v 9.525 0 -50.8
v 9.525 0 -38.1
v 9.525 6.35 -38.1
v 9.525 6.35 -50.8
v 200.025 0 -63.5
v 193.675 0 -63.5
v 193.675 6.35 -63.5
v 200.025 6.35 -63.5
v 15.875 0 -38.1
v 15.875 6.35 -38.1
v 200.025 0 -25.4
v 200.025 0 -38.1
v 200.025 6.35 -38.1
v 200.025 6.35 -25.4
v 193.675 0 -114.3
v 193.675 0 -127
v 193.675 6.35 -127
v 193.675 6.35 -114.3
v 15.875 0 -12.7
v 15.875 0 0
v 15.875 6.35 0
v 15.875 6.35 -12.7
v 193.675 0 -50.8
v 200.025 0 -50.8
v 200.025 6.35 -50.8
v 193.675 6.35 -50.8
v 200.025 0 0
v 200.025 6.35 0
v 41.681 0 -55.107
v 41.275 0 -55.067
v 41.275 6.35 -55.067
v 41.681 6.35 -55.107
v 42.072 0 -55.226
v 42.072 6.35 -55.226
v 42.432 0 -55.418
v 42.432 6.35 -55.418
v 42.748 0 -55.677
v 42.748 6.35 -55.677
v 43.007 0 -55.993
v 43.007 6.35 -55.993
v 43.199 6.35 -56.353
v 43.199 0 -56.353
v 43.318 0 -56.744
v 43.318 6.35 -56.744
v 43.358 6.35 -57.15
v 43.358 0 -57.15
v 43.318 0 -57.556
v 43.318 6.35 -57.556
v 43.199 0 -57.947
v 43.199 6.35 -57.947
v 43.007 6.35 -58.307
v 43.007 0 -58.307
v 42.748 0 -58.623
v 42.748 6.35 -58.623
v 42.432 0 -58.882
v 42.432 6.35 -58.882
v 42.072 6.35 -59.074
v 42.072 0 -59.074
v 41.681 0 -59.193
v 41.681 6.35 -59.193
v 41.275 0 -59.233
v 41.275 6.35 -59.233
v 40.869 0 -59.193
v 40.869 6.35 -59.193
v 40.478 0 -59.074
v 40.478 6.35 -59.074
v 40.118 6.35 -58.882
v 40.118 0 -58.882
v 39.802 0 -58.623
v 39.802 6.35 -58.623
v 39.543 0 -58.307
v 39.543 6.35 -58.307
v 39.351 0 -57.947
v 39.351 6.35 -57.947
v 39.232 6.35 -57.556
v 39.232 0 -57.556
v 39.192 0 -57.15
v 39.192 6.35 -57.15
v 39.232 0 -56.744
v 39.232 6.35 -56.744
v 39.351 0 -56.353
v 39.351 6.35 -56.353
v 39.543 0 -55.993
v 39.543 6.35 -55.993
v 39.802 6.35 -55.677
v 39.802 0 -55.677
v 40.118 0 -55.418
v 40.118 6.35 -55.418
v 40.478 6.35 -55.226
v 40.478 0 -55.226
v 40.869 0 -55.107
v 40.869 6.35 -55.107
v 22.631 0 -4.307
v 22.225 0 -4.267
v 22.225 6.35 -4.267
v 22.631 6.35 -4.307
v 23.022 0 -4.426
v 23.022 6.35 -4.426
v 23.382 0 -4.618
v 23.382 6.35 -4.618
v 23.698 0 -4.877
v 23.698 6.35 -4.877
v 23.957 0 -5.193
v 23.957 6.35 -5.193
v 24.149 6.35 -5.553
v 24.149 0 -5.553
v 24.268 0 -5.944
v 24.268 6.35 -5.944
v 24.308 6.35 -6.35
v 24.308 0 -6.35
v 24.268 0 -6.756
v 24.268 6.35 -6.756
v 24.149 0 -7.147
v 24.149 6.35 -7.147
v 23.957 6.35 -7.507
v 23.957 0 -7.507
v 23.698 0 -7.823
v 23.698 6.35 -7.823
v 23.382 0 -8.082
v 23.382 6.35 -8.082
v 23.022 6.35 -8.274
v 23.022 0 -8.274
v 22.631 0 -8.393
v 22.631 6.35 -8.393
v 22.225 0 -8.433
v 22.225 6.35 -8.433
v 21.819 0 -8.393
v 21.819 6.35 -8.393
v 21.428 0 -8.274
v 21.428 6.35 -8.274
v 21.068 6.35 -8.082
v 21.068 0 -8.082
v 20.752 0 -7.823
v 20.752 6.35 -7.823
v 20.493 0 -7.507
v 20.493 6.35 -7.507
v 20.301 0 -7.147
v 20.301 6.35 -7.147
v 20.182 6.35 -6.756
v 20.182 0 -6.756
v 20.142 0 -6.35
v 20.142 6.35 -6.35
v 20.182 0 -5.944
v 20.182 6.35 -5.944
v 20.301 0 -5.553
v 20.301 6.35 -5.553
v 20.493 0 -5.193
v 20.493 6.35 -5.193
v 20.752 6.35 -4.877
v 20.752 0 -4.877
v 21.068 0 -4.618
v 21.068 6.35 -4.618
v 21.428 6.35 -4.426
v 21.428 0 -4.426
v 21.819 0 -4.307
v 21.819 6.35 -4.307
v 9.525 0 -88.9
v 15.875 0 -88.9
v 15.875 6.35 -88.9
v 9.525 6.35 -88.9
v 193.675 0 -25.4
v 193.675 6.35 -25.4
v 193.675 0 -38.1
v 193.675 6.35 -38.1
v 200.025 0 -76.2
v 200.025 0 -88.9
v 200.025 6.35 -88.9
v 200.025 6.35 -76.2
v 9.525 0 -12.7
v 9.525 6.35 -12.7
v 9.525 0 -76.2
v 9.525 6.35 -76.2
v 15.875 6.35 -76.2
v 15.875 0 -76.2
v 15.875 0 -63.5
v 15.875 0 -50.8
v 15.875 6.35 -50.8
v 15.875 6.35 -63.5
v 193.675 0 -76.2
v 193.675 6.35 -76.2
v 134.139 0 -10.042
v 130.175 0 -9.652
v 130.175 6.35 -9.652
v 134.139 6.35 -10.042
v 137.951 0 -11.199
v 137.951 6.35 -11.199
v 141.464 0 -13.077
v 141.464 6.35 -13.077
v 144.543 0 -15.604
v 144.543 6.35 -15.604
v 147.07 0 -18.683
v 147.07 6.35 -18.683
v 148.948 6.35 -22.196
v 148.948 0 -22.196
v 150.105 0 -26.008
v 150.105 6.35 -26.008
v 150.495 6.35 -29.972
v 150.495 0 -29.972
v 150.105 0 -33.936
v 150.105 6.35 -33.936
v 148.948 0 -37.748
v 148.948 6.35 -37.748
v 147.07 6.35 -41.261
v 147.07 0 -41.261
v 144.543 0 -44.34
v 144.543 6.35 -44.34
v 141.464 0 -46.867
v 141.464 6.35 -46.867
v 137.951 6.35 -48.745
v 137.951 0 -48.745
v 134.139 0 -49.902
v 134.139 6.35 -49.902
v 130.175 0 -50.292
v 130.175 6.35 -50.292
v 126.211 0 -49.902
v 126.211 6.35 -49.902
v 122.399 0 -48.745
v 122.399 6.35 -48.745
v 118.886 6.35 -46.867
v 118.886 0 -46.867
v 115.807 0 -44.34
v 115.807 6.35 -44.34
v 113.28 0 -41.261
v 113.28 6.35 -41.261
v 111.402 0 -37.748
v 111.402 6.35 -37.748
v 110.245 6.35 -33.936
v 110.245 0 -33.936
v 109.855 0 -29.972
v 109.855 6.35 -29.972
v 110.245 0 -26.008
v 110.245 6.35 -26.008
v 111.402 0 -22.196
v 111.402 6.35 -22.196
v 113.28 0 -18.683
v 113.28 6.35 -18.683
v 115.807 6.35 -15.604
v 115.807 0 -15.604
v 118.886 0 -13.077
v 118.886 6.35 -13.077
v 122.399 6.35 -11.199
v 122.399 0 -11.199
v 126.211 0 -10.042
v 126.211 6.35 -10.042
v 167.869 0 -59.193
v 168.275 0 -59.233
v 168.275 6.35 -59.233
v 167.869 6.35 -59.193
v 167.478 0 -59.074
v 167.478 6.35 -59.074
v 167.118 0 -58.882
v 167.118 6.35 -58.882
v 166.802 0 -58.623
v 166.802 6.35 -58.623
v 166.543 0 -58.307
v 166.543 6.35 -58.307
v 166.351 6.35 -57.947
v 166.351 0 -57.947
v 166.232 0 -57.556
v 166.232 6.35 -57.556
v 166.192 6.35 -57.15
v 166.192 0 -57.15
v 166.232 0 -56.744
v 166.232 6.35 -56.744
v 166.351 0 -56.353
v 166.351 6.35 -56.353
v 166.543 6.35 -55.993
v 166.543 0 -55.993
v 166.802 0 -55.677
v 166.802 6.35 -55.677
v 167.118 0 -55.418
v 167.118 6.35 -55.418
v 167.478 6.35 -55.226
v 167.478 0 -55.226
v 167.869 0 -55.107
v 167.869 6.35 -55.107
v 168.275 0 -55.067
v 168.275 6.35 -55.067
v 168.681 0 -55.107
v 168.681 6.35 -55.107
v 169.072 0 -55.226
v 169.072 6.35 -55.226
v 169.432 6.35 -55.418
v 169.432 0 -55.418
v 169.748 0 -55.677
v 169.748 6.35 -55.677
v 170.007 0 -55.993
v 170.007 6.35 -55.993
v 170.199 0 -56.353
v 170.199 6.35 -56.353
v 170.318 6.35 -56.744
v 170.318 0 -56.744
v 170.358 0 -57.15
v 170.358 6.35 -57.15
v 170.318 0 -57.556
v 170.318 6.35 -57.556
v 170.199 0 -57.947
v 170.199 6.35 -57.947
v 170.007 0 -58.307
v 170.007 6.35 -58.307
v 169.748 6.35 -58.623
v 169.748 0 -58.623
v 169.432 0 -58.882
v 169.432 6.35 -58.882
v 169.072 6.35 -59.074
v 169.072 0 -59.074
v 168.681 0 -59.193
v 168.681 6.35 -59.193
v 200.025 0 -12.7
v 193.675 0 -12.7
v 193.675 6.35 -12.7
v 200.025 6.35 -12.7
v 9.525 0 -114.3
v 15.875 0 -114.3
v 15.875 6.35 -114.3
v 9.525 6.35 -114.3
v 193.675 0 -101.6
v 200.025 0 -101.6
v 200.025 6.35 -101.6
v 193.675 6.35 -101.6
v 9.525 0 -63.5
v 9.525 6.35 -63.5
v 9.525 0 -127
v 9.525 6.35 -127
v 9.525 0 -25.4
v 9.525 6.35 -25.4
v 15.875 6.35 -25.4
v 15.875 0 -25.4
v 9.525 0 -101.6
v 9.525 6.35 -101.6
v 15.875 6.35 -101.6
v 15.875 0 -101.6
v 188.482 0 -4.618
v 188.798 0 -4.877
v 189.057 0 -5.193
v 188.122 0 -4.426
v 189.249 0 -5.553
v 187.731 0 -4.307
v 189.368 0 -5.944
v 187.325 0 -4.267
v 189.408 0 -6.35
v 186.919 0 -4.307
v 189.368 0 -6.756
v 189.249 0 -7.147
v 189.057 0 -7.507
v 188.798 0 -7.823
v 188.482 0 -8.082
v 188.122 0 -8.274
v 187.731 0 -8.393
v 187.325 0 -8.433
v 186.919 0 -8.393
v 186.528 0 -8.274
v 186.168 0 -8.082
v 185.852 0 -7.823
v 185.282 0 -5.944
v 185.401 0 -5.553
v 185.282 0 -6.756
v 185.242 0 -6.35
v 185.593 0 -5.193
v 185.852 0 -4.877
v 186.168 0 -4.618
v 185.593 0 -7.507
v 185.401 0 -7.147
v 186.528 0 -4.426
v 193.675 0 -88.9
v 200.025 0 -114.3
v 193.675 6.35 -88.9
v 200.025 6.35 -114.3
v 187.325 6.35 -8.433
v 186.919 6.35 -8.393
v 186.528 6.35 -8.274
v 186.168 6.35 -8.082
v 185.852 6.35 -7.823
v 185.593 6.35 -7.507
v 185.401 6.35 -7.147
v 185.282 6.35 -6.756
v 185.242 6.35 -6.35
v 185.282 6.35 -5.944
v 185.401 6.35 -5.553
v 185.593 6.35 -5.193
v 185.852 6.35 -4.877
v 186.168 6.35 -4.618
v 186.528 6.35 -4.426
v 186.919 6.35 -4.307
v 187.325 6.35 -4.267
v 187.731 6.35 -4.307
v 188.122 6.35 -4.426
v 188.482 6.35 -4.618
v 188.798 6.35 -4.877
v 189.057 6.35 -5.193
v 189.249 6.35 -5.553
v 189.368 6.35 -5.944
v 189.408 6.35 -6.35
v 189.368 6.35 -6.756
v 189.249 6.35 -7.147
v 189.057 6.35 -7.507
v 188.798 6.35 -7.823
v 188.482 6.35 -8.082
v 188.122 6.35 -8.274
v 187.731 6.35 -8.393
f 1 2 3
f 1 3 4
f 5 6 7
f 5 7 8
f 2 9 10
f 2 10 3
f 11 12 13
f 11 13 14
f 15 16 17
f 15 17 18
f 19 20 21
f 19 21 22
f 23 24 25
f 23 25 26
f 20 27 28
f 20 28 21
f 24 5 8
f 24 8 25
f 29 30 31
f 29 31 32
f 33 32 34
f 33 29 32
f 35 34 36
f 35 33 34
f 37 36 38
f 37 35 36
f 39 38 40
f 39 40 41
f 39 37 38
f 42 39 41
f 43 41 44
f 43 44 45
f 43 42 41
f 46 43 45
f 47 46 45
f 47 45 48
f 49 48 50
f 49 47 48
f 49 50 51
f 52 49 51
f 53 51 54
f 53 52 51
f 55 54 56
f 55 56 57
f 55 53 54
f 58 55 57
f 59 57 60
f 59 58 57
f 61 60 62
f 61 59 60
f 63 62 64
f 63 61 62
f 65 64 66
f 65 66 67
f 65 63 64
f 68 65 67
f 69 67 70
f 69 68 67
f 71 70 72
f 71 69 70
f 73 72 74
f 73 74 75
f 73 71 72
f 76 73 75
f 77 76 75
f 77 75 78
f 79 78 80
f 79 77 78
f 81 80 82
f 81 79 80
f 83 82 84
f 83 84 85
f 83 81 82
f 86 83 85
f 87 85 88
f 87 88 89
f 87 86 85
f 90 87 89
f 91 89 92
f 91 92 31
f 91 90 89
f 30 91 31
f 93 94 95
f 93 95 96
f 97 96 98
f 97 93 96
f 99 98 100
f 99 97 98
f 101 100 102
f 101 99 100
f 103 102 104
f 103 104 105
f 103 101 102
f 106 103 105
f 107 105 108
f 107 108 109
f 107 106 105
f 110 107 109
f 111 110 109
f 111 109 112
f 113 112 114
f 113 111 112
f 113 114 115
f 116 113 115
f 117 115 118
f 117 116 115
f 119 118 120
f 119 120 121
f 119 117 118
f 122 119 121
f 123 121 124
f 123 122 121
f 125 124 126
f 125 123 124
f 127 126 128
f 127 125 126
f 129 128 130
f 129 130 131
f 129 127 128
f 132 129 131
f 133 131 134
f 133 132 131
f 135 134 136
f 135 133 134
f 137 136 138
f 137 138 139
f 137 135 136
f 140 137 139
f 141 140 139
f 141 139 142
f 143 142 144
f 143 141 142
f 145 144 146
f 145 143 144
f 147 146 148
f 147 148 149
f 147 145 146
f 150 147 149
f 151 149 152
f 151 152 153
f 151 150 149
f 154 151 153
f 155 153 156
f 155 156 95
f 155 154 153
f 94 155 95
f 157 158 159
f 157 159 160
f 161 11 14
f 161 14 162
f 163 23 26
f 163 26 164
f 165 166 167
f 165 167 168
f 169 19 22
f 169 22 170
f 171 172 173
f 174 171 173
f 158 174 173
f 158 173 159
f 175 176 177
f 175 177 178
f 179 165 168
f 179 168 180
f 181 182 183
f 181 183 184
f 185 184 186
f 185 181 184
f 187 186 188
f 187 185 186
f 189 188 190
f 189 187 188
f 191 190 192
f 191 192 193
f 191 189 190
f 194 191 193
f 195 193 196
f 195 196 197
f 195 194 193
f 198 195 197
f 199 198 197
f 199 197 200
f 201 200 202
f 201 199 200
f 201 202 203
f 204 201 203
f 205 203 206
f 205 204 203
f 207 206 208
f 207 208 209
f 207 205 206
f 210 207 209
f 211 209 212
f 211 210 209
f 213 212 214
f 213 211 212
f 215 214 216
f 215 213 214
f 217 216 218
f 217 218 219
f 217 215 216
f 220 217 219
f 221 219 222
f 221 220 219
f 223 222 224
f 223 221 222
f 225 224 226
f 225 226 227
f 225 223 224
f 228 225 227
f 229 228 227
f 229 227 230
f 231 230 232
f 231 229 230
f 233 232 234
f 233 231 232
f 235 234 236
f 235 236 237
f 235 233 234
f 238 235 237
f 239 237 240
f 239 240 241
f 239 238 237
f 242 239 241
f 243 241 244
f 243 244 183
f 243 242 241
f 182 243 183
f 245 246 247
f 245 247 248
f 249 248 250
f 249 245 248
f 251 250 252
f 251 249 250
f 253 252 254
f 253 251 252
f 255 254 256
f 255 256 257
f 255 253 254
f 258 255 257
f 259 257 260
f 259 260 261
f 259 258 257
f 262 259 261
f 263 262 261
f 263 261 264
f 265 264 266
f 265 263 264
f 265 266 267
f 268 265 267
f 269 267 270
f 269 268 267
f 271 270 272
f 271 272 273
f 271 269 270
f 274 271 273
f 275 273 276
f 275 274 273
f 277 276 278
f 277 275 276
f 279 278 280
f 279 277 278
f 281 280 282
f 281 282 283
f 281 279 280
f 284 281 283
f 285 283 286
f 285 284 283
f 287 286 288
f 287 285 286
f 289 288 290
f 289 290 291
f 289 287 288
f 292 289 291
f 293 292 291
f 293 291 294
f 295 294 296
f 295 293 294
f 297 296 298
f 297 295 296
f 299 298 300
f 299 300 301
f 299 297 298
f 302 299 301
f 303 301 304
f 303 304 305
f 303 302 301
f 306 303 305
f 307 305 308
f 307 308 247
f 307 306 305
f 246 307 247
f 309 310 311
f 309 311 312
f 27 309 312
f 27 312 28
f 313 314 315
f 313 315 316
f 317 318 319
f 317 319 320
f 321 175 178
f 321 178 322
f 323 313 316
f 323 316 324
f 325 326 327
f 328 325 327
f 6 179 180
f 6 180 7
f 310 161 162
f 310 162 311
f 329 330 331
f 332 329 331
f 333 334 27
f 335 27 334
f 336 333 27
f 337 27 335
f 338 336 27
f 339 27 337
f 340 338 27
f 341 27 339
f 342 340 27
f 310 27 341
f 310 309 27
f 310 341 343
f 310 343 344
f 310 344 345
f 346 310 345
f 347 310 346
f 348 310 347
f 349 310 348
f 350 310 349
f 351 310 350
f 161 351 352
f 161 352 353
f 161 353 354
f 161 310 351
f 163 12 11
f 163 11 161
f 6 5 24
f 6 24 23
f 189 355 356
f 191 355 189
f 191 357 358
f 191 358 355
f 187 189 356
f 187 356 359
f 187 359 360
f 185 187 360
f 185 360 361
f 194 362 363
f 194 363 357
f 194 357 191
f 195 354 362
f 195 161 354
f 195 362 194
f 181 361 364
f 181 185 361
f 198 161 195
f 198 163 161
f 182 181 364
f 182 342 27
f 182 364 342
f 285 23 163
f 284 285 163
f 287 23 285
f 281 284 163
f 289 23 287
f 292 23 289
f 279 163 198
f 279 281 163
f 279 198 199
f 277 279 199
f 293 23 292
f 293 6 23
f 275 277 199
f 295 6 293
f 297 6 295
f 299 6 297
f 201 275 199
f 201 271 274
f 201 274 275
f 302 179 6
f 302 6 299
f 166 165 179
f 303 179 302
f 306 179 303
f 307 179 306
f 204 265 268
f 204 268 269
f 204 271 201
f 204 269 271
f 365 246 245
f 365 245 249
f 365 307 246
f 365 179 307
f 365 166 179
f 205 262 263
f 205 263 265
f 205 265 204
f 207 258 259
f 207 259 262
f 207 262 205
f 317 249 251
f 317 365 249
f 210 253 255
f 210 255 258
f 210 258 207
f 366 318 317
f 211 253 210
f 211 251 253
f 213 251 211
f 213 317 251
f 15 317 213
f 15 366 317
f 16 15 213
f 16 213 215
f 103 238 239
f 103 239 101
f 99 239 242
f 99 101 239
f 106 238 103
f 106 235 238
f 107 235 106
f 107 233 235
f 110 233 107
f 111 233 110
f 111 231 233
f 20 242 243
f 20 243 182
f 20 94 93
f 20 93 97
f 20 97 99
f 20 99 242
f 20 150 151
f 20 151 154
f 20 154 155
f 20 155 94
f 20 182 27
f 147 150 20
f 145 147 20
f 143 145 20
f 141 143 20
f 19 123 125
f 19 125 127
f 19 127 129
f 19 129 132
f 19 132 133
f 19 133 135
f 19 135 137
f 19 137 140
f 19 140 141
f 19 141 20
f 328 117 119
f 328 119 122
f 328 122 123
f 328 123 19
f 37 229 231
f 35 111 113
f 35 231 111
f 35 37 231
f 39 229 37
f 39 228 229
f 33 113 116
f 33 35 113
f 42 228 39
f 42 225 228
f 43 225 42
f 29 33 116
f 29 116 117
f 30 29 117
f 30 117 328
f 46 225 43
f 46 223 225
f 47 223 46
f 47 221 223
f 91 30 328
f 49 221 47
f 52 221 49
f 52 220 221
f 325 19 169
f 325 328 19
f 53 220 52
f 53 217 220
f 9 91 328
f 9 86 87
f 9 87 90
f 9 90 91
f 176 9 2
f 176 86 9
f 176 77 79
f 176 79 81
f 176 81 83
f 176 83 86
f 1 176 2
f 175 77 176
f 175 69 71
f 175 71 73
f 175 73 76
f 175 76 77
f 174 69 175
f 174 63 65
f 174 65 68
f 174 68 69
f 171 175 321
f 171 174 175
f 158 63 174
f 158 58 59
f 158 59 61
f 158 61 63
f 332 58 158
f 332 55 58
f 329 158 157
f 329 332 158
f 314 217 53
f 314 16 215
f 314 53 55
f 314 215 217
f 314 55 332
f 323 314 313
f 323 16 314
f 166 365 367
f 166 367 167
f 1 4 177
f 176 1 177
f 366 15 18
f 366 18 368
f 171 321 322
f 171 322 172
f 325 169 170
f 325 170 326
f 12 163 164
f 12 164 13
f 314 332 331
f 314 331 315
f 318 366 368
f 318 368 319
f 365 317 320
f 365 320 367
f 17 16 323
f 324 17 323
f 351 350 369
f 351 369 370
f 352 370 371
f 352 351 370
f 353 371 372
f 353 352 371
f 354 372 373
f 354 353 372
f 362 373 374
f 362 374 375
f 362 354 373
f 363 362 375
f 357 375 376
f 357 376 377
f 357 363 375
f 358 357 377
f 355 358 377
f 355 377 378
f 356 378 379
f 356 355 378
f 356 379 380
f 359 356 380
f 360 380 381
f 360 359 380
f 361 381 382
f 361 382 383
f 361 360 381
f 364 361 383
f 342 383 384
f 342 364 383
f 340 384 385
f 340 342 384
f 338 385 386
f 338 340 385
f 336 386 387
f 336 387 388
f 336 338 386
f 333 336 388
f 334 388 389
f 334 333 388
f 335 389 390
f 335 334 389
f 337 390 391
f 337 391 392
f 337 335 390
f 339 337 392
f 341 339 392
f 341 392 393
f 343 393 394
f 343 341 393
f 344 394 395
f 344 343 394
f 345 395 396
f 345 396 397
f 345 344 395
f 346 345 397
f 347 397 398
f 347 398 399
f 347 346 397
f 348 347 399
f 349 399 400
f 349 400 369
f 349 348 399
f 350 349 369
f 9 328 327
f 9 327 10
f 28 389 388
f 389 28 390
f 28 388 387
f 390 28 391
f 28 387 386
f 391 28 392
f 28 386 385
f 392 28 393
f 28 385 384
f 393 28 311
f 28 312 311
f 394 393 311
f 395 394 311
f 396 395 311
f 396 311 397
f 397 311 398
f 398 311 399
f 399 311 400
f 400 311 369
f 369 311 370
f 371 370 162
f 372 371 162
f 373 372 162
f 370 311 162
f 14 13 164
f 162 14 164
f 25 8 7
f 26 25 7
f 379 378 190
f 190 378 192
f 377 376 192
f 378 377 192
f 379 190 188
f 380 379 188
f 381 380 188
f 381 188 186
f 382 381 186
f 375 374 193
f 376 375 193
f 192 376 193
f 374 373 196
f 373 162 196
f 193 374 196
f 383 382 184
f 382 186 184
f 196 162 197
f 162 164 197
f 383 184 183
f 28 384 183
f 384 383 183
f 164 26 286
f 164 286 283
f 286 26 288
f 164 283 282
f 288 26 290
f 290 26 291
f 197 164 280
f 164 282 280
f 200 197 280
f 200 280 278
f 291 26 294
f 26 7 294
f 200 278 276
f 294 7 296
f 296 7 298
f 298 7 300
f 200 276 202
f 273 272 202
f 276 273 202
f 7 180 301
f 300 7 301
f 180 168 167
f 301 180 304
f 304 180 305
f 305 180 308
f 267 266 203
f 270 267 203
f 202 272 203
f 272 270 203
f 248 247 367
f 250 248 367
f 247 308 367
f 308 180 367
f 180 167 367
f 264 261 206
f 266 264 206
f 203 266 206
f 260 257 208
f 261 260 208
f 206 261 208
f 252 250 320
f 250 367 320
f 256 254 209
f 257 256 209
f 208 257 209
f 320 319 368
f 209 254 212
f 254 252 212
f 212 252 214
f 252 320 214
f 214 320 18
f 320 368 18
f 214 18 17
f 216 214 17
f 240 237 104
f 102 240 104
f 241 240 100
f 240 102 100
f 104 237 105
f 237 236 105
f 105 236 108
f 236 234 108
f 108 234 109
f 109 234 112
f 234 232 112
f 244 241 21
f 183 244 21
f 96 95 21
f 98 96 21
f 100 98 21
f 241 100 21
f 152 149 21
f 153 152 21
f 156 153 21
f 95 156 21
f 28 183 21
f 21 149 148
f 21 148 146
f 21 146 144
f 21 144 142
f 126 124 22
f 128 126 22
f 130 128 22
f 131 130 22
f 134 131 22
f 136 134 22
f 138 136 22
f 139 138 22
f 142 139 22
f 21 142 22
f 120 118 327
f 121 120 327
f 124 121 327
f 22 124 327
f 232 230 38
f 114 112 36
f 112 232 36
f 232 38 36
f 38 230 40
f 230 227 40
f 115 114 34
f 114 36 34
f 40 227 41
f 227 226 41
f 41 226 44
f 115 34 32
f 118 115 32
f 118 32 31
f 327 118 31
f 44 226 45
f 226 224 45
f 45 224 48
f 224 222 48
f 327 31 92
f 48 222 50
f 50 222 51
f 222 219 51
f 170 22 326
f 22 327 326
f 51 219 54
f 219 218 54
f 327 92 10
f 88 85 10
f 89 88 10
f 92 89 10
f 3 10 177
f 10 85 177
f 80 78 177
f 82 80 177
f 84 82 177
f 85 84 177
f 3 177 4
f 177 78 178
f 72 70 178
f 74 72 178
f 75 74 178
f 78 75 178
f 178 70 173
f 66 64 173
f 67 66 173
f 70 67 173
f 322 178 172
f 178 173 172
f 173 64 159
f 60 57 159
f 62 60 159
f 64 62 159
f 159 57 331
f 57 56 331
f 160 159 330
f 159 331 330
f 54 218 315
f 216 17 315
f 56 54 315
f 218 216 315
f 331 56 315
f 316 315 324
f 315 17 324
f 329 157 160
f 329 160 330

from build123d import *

# Parameters (mm, degrees)
SKETCH2_R           = 2.0828
SKETCH2_R_2         = 20.32
BOSS_EXTRUDE1_DEPTH = 6.35


with BuildPart() as part:
    # Sketch2 → Boss-Extrude1 (new body)
    with BuildSketch(Plane(origin=(0, 0, 0), x_dir=(1, 0, 0), z_dir=(0, 1, 0))):
        Polygon((15.875, 0), (15.875, 12.7), (9.525, 12.7), (9.525, 25.4), (15.875, 25.4), (15.875, 38.1), (9.525, 38.1), (9.525, 50.8), (15.875, 50.8), (15.875, 63.5), (9.525, 63.5), (9.525, 76.2), (15.875, 76.2), (15.875, 88.9), (9.525, 88.9), (9.525, 101.6), (15.875, 101.6), (15.875, 114.3), (9.525, 114.3), (9.525, 127), (15.875, 127), (193.675, 127), (193.675, 114.3), (200.025, 114.3), (200.025, 101.6), (193.675, 101.6), (193.675, 88.9), (200.025, 88.9), (200.025, 76.2), (193.675, 76.2), (193.675, 63.5), (200.025, 63.5), (200.025, 50.8), (193.675, 50.8), (193.675, 38.1), (200.025, 38.1), (200.025, 25.4), (193.675, 25.4), (193.675, 12.7), (200.025, 12.7), (200.025, 0), align=None)
        with Locations(Location((41.275, 57.15, 0), (0, 0, 270))):
            Circle(SKETCH2_R, mode=Mode.SUBTRACT)
        with Locations(Location((168.275, 57.15, 0), (0, 0, 90))):
            Circle(SKETCH2_R, mode=Mode.SUBTRACT)
        with Locations(Location((130.175, 29.972, 0), (0, 0, 270))):
            Circle(SKETCH2_R_2, mode=Mode.SUBTRACT)
        with Locations(Location((22.225, 6.35, 0), (0, 0, 270))):
            Circle(SKETCH2_R, mode=Mode.SUBTRACT)
        with Locations(Location((187.325, 6.35, 0), (0, 0, 90))):
            Circle(SKETCH2_R, mode=Mode.SUBTRACT)
    extrude(amount=BOSS_EXTRUDE1_DEPTH)


solid = part.part
